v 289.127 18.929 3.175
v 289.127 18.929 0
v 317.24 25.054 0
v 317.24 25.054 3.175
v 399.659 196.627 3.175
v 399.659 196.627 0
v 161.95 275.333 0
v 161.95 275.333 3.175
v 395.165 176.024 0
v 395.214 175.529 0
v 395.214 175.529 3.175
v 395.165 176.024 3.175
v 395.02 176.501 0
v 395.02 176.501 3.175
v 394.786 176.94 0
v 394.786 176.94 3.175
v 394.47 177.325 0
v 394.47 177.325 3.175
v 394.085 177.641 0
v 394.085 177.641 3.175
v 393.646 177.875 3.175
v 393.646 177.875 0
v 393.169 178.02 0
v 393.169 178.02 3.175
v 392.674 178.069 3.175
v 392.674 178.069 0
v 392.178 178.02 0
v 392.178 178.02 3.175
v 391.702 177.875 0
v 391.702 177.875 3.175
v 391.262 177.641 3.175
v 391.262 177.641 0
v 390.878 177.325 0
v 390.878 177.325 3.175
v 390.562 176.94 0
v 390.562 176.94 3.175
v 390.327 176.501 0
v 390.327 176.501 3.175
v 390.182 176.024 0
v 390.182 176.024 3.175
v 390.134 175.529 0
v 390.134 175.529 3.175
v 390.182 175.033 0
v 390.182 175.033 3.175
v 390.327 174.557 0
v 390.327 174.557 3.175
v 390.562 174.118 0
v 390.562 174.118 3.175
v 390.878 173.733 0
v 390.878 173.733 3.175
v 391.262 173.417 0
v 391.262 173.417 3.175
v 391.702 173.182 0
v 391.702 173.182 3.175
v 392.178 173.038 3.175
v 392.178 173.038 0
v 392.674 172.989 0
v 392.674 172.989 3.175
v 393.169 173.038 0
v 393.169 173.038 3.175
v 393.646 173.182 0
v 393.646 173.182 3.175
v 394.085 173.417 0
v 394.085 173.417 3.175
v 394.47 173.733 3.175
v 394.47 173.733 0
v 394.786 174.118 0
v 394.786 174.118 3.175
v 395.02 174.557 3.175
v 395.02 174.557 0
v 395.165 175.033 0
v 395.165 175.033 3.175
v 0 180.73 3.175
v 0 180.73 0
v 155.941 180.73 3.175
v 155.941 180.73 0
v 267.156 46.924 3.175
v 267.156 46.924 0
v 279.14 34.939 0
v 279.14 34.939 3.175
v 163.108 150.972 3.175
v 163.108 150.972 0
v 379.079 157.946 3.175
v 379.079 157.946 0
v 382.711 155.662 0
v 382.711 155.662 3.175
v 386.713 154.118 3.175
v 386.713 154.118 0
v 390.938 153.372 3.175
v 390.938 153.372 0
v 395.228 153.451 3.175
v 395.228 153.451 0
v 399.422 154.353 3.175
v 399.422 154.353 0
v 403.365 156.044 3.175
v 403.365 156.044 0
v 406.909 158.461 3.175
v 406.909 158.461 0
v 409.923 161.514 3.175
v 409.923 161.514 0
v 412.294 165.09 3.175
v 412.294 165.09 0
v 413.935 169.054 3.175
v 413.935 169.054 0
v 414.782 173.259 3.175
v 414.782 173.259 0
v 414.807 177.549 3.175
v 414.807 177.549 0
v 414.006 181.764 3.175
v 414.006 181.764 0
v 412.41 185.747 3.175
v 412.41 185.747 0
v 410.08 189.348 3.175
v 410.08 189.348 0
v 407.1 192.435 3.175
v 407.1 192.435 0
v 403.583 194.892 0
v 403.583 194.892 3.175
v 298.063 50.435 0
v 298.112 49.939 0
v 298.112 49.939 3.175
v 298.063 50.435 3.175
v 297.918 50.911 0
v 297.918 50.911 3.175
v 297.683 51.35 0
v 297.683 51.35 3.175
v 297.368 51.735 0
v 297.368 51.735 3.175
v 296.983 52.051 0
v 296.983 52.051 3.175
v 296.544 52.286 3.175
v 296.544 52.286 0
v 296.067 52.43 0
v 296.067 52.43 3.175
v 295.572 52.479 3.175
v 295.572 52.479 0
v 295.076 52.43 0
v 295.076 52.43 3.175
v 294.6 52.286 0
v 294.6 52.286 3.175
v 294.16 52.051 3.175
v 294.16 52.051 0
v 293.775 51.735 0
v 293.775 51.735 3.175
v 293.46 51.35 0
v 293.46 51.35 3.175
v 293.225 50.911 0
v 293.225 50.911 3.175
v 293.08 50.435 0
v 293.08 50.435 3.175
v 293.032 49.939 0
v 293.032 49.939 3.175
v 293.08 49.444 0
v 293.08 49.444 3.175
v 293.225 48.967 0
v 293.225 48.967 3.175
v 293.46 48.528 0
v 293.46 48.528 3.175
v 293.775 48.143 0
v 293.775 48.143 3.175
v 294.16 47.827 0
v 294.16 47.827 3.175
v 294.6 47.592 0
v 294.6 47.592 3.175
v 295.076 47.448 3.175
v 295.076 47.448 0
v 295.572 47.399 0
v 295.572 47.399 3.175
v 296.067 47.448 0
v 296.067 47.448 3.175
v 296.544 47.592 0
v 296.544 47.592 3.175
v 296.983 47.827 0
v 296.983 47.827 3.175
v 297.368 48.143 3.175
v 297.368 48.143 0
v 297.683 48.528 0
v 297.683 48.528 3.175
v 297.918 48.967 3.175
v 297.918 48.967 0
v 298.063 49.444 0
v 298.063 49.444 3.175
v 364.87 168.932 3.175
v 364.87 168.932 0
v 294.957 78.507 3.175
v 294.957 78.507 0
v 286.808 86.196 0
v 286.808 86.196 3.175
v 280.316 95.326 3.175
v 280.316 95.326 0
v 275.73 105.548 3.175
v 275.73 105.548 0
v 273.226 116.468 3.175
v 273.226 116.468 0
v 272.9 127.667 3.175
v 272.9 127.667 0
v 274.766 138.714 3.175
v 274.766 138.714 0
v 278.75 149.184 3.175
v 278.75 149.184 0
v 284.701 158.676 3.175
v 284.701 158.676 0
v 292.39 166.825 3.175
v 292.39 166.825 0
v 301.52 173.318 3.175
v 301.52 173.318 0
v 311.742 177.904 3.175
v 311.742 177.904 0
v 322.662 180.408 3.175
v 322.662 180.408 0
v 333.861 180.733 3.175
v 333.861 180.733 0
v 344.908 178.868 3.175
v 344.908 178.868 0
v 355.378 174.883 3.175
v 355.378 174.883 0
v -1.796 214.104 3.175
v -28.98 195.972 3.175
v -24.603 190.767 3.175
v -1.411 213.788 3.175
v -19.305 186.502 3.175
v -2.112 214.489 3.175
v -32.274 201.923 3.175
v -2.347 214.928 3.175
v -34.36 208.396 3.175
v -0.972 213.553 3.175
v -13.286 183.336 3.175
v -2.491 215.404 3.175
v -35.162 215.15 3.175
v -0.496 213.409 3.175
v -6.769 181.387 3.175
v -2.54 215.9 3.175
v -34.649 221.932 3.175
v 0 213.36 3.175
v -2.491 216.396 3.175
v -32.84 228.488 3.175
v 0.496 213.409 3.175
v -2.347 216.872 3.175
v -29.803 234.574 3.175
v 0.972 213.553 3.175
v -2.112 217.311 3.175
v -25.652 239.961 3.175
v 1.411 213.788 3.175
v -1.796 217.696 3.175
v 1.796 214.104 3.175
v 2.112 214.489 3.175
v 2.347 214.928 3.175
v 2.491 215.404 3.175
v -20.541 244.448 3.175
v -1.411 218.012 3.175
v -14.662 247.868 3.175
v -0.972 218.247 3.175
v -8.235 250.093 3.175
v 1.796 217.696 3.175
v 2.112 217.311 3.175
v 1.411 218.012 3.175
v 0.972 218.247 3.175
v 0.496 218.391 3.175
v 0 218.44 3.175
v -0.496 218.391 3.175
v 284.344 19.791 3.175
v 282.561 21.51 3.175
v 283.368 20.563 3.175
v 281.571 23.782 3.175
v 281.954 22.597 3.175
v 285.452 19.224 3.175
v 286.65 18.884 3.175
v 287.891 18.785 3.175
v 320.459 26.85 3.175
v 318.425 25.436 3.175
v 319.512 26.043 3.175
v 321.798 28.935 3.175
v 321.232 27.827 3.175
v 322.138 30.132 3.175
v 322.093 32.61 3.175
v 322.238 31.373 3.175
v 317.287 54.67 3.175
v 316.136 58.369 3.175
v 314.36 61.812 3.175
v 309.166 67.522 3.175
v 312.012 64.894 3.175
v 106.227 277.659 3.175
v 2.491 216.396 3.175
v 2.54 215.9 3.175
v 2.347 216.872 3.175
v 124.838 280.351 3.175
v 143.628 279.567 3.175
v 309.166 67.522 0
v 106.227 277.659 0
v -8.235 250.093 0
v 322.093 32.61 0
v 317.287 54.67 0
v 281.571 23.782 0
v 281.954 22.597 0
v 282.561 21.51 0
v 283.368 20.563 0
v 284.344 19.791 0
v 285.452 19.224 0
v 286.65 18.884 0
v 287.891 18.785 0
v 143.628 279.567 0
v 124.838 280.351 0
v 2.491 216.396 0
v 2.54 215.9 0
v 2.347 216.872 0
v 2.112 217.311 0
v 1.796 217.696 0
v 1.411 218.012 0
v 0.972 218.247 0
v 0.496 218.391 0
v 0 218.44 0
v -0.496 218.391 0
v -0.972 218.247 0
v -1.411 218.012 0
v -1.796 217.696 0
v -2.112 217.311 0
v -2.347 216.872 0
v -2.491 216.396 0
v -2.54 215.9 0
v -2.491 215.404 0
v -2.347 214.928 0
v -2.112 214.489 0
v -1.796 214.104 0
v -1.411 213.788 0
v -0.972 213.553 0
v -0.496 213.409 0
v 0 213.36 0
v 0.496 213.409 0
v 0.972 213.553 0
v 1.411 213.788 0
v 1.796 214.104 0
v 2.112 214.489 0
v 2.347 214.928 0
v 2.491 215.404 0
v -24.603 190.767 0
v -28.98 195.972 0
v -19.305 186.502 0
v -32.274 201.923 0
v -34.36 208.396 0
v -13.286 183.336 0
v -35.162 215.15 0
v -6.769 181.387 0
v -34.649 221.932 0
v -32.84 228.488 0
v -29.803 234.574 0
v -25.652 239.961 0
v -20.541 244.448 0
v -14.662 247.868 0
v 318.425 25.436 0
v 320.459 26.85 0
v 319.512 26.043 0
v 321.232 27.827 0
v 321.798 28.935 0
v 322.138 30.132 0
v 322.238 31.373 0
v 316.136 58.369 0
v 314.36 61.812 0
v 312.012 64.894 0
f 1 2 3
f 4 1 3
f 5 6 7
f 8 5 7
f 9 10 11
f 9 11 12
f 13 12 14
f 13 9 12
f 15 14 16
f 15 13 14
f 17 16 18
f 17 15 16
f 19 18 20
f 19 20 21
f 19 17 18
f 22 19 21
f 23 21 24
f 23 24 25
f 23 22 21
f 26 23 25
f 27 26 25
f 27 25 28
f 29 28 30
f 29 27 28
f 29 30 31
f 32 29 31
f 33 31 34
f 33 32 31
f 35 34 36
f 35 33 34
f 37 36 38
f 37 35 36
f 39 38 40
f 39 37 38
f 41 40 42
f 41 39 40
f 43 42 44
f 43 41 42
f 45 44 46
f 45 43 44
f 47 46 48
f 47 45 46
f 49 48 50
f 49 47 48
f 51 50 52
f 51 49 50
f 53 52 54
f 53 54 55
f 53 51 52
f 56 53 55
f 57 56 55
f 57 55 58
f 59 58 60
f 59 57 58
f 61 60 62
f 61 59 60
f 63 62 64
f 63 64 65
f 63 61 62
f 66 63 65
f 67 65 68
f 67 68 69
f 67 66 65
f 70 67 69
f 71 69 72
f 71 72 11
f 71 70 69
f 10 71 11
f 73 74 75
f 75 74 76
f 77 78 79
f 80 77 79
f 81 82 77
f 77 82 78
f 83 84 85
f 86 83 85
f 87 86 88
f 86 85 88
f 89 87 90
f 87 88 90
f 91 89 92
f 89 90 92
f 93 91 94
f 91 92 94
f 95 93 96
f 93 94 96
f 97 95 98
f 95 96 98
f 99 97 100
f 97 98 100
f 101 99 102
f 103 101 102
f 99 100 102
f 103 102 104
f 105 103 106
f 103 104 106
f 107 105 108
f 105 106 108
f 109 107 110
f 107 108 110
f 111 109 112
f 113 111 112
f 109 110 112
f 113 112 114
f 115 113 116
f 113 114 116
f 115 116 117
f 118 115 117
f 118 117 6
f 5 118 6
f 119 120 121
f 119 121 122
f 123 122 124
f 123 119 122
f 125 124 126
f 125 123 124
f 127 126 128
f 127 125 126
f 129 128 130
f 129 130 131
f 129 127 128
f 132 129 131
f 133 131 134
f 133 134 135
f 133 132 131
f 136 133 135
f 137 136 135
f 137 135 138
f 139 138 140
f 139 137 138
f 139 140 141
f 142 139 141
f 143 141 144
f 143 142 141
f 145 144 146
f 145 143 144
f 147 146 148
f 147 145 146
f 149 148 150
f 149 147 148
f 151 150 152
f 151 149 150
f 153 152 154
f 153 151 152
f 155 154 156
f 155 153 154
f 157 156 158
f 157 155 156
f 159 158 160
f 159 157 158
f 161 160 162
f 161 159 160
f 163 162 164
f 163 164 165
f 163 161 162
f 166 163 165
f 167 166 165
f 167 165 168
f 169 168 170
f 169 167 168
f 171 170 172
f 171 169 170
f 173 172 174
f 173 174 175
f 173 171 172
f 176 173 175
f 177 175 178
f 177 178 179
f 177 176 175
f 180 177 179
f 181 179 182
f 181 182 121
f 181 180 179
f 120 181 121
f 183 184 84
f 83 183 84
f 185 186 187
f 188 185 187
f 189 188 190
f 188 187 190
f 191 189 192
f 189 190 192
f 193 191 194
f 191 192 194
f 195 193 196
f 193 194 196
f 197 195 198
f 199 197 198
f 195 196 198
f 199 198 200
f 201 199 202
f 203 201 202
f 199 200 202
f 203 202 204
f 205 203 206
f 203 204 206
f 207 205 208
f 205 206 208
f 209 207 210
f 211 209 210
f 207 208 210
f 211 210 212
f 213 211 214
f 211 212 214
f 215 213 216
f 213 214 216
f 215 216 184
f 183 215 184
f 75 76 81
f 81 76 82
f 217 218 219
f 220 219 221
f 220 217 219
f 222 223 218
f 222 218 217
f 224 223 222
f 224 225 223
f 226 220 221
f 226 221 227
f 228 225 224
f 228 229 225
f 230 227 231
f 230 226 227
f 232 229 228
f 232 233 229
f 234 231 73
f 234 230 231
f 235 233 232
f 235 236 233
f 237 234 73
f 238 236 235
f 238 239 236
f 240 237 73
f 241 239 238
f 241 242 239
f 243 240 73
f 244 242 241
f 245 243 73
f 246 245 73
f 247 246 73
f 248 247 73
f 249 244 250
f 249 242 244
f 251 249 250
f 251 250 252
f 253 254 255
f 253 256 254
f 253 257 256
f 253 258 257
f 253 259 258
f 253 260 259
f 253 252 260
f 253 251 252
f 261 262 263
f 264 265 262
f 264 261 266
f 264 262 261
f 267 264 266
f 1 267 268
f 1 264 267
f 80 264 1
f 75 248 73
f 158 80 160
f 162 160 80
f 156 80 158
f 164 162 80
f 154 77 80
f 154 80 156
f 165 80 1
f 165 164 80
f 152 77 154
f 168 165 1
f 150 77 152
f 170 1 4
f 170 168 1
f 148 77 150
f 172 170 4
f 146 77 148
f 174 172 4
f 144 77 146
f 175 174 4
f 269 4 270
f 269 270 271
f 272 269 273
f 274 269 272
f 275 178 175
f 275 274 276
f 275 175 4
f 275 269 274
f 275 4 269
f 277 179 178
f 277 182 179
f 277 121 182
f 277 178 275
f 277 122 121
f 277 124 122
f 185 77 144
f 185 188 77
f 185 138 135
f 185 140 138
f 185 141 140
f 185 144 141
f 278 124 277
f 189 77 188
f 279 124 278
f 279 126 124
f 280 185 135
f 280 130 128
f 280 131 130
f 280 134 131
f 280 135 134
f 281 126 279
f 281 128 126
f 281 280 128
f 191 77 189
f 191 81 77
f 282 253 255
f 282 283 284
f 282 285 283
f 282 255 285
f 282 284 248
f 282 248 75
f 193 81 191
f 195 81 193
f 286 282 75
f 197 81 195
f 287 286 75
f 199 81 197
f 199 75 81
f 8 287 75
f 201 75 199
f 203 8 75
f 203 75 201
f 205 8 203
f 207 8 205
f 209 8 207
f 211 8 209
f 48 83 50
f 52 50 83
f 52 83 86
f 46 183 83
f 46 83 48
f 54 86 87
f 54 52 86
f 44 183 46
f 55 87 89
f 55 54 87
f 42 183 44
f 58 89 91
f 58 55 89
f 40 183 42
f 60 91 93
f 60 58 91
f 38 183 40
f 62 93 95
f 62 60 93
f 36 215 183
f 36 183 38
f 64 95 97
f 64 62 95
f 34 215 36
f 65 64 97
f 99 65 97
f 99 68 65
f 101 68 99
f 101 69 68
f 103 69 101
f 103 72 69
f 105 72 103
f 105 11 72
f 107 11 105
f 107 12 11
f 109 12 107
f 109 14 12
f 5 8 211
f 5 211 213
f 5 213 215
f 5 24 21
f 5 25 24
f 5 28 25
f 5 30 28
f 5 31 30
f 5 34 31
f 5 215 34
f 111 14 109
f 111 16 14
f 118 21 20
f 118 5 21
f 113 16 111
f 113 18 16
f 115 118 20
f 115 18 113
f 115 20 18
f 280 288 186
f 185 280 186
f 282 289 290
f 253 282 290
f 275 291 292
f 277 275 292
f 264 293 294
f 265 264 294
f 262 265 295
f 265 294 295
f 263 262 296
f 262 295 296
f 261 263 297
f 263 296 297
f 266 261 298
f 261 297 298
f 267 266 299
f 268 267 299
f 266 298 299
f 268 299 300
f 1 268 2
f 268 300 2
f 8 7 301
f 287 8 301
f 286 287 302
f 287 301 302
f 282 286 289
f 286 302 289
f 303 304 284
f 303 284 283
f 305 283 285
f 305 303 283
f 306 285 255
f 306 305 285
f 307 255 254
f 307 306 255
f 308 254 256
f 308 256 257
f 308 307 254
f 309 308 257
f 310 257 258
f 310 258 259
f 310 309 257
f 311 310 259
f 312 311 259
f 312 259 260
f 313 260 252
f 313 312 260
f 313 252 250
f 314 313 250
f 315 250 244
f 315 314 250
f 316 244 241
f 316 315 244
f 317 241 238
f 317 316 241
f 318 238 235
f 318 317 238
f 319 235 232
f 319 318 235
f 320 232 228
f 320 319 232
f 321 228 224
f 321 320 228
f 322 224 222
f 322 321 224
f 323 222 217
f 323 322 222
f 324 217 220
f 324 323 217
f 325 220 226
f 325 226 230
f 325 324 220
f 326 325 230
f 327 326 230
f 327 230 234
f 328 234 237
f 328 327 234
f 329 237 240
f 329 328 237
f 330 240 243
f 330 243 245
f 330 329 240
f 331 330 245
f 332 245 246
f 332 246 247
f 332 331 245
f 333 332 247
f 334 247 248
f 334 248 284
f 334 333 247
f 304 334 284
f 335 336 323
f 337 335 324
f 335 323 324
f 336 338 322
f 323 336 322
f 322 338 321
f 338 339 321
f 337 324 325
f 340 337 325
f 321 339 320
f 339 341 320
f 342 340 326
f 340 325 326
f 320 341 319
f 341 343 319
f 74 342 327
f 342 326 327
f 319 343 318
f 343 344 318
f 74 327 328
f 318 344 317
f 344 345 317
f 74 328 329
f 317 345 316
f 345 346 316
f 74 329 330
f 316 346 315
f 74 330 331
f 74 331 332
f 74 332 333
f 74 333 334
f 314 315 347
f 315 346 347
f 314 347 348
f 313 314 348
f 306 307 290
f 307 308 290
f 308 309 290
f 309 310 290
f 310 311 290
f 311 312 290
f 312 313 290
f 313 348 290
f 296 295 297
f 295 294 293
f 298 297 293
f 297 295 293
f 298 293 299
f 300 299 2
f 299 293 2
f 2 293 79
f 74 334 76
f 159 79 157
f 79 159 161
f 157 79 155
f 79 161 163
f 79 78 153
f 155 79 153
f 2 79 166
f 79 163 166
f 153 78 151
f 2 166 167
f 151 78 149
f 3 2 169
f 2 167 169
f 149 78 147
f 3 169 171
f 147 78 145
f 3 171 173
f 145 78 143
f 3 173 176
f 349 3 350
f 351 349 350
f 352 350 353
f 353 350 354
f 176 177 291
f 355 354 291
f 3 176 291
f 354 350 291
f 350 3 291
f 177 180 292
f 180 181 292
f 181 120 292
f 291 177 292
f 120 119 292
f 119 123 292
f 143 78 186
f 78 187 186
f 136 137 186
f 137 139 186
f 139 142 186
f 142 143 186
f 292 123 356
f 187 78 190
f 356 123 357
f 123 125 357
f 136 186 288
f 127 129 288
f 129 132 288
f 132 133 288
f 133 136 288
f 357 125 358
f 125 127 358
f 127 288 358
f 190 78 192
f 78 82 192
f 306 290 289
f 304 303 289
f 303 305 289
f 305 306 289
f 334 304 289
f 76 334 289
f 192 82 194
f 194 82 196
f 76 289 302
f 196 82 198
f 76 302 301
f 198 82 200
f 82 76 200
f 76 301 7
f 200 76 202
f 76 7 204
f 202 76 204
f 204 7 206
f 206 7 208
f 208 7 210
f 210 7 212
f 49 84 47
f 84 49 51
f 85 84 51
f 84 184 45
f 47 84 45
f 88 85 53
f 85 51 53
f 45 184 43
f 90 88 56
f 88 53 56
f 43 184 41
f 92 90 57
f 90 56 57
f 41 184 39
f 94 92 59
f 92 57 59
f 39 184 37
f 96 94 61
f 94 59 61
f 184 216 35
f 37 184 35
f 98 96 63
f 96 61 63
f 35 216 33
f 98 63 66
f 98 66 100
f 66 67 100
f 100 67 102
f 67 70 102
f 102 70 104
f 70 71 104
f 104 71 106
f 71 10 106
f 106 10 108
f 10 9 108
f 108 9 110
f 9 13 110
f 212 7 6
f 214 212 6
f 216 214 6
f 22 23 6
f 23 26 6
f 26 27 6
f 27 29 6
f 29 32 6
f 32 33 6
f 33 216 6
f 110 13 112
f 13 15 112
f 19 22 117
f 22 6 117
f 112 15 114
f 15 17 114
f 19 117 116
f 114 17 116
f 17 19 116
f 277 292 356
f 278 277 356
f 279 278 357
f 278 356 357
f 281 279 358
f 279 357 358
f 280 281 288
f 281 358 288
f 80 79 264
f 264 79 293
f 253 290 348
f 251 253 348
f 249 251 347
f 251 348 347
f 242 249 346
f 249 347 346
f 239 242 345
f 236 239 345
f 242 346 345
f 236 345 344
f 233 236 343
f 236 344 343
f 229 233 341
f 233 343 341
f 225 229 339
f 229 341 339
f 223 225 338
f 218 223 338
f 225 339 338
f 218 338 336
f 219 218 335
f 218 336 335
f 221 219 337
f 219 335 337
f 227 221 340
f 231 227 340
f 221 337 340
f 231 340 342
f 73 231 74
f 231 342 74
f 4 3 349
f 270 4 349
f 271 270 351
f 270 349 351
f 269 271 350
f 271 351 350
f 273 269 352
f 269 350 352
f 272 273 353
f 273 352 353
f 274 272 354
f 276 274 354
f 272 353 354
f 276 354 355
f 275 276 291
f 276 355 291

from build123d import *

# Parameters (mm, degrees)
SKETCH1_R           = 2.54
BOSS_EXTRUDE1_DEPTH = 3.175


with BuildPart() as part:
    # Sketch1 → Boss-Extrude1 (new body)
    with BuildSketch(Plane.XY):
        with BuildLine():
            Line((267.156088922, 46.92365038), (279.140387862, 34.939351441))
            Line((279.140387862, 34.939351441), (281.571044282, 23.781894278))
            ThreePointArc((281.571044282, 23.781894278), (284.344053276, 19.790554308), (289.127170298, 18.929064213))
            Line((289.127170298, 18.929064213), (317.240211958, 25.053501369))
            ThreePointArc((317.240211958, 25.053501369), (321.231551928, 27.826510362), (322.093042023, 32.609627384))
            Line((322.093042023, 32.609627384), (317.287210275, 54.669866506))
            ThreePointArc((317.287210275, 54.669866506), (314.35957702, 61.811763931), (309.165828873, 67.521642695))
            Line((309.165828873, 67.521642695), (294.956987541, 78.507489408))
            ThreePointArc((294.956987541, 78.507489408), (284.701481461, 158.676495857), (364.87048791, 168.932001937))
            Line((364.87048791, 168.932001937), (379.079329242, 157.946155224))
            ThreePointArc((379.079329242, 157.946155224), (412.294400675, 165.089560033), (399.659420331, 196.627259288))
            Line((399.659420331, 196.627259288), (161.950324224, 275.333486261))
            ThreePointArc((161.950324224, 275.333486261), (134.2512057, 280.394583932), (106.226730954, 277.658767447))
            Line((106.226730954, 277.658767447), (-8.234725559, 250.092638572))
            ThreePointArc((-8.234725559, 250.092638572), (-34.925, 211.753723054), (0, 180.729739303))
            Line((0, 180.729739303), (91.265902063, 180.729739303))
            Line((91.265902063, 180.729739303), (155.941245852, 180.729739303))
            Line((155.941245852, 180.729739303), (163.107951031, 150.971788271))
            Line((163.107951031, 150.971788271), (267.156088922, 46.92365038))
        make_face()
        with Locations((392.673620981, 175.528699327)):
            Circle(SKETCH1_R, mode=Mode.SUBTRACT)
        with Locations((295.571537134, 49.939098592)):
            Circle(SKETCH1_R, mode=Mode.SUBTRACT)
        with Locations((0, 215.9)):
            Circle(SKETCH1_R, mode=Mode.SUBTRACT)
    extrude(amount=BOSS_EXTRUDE1_DEPTH)


solid = part.part
